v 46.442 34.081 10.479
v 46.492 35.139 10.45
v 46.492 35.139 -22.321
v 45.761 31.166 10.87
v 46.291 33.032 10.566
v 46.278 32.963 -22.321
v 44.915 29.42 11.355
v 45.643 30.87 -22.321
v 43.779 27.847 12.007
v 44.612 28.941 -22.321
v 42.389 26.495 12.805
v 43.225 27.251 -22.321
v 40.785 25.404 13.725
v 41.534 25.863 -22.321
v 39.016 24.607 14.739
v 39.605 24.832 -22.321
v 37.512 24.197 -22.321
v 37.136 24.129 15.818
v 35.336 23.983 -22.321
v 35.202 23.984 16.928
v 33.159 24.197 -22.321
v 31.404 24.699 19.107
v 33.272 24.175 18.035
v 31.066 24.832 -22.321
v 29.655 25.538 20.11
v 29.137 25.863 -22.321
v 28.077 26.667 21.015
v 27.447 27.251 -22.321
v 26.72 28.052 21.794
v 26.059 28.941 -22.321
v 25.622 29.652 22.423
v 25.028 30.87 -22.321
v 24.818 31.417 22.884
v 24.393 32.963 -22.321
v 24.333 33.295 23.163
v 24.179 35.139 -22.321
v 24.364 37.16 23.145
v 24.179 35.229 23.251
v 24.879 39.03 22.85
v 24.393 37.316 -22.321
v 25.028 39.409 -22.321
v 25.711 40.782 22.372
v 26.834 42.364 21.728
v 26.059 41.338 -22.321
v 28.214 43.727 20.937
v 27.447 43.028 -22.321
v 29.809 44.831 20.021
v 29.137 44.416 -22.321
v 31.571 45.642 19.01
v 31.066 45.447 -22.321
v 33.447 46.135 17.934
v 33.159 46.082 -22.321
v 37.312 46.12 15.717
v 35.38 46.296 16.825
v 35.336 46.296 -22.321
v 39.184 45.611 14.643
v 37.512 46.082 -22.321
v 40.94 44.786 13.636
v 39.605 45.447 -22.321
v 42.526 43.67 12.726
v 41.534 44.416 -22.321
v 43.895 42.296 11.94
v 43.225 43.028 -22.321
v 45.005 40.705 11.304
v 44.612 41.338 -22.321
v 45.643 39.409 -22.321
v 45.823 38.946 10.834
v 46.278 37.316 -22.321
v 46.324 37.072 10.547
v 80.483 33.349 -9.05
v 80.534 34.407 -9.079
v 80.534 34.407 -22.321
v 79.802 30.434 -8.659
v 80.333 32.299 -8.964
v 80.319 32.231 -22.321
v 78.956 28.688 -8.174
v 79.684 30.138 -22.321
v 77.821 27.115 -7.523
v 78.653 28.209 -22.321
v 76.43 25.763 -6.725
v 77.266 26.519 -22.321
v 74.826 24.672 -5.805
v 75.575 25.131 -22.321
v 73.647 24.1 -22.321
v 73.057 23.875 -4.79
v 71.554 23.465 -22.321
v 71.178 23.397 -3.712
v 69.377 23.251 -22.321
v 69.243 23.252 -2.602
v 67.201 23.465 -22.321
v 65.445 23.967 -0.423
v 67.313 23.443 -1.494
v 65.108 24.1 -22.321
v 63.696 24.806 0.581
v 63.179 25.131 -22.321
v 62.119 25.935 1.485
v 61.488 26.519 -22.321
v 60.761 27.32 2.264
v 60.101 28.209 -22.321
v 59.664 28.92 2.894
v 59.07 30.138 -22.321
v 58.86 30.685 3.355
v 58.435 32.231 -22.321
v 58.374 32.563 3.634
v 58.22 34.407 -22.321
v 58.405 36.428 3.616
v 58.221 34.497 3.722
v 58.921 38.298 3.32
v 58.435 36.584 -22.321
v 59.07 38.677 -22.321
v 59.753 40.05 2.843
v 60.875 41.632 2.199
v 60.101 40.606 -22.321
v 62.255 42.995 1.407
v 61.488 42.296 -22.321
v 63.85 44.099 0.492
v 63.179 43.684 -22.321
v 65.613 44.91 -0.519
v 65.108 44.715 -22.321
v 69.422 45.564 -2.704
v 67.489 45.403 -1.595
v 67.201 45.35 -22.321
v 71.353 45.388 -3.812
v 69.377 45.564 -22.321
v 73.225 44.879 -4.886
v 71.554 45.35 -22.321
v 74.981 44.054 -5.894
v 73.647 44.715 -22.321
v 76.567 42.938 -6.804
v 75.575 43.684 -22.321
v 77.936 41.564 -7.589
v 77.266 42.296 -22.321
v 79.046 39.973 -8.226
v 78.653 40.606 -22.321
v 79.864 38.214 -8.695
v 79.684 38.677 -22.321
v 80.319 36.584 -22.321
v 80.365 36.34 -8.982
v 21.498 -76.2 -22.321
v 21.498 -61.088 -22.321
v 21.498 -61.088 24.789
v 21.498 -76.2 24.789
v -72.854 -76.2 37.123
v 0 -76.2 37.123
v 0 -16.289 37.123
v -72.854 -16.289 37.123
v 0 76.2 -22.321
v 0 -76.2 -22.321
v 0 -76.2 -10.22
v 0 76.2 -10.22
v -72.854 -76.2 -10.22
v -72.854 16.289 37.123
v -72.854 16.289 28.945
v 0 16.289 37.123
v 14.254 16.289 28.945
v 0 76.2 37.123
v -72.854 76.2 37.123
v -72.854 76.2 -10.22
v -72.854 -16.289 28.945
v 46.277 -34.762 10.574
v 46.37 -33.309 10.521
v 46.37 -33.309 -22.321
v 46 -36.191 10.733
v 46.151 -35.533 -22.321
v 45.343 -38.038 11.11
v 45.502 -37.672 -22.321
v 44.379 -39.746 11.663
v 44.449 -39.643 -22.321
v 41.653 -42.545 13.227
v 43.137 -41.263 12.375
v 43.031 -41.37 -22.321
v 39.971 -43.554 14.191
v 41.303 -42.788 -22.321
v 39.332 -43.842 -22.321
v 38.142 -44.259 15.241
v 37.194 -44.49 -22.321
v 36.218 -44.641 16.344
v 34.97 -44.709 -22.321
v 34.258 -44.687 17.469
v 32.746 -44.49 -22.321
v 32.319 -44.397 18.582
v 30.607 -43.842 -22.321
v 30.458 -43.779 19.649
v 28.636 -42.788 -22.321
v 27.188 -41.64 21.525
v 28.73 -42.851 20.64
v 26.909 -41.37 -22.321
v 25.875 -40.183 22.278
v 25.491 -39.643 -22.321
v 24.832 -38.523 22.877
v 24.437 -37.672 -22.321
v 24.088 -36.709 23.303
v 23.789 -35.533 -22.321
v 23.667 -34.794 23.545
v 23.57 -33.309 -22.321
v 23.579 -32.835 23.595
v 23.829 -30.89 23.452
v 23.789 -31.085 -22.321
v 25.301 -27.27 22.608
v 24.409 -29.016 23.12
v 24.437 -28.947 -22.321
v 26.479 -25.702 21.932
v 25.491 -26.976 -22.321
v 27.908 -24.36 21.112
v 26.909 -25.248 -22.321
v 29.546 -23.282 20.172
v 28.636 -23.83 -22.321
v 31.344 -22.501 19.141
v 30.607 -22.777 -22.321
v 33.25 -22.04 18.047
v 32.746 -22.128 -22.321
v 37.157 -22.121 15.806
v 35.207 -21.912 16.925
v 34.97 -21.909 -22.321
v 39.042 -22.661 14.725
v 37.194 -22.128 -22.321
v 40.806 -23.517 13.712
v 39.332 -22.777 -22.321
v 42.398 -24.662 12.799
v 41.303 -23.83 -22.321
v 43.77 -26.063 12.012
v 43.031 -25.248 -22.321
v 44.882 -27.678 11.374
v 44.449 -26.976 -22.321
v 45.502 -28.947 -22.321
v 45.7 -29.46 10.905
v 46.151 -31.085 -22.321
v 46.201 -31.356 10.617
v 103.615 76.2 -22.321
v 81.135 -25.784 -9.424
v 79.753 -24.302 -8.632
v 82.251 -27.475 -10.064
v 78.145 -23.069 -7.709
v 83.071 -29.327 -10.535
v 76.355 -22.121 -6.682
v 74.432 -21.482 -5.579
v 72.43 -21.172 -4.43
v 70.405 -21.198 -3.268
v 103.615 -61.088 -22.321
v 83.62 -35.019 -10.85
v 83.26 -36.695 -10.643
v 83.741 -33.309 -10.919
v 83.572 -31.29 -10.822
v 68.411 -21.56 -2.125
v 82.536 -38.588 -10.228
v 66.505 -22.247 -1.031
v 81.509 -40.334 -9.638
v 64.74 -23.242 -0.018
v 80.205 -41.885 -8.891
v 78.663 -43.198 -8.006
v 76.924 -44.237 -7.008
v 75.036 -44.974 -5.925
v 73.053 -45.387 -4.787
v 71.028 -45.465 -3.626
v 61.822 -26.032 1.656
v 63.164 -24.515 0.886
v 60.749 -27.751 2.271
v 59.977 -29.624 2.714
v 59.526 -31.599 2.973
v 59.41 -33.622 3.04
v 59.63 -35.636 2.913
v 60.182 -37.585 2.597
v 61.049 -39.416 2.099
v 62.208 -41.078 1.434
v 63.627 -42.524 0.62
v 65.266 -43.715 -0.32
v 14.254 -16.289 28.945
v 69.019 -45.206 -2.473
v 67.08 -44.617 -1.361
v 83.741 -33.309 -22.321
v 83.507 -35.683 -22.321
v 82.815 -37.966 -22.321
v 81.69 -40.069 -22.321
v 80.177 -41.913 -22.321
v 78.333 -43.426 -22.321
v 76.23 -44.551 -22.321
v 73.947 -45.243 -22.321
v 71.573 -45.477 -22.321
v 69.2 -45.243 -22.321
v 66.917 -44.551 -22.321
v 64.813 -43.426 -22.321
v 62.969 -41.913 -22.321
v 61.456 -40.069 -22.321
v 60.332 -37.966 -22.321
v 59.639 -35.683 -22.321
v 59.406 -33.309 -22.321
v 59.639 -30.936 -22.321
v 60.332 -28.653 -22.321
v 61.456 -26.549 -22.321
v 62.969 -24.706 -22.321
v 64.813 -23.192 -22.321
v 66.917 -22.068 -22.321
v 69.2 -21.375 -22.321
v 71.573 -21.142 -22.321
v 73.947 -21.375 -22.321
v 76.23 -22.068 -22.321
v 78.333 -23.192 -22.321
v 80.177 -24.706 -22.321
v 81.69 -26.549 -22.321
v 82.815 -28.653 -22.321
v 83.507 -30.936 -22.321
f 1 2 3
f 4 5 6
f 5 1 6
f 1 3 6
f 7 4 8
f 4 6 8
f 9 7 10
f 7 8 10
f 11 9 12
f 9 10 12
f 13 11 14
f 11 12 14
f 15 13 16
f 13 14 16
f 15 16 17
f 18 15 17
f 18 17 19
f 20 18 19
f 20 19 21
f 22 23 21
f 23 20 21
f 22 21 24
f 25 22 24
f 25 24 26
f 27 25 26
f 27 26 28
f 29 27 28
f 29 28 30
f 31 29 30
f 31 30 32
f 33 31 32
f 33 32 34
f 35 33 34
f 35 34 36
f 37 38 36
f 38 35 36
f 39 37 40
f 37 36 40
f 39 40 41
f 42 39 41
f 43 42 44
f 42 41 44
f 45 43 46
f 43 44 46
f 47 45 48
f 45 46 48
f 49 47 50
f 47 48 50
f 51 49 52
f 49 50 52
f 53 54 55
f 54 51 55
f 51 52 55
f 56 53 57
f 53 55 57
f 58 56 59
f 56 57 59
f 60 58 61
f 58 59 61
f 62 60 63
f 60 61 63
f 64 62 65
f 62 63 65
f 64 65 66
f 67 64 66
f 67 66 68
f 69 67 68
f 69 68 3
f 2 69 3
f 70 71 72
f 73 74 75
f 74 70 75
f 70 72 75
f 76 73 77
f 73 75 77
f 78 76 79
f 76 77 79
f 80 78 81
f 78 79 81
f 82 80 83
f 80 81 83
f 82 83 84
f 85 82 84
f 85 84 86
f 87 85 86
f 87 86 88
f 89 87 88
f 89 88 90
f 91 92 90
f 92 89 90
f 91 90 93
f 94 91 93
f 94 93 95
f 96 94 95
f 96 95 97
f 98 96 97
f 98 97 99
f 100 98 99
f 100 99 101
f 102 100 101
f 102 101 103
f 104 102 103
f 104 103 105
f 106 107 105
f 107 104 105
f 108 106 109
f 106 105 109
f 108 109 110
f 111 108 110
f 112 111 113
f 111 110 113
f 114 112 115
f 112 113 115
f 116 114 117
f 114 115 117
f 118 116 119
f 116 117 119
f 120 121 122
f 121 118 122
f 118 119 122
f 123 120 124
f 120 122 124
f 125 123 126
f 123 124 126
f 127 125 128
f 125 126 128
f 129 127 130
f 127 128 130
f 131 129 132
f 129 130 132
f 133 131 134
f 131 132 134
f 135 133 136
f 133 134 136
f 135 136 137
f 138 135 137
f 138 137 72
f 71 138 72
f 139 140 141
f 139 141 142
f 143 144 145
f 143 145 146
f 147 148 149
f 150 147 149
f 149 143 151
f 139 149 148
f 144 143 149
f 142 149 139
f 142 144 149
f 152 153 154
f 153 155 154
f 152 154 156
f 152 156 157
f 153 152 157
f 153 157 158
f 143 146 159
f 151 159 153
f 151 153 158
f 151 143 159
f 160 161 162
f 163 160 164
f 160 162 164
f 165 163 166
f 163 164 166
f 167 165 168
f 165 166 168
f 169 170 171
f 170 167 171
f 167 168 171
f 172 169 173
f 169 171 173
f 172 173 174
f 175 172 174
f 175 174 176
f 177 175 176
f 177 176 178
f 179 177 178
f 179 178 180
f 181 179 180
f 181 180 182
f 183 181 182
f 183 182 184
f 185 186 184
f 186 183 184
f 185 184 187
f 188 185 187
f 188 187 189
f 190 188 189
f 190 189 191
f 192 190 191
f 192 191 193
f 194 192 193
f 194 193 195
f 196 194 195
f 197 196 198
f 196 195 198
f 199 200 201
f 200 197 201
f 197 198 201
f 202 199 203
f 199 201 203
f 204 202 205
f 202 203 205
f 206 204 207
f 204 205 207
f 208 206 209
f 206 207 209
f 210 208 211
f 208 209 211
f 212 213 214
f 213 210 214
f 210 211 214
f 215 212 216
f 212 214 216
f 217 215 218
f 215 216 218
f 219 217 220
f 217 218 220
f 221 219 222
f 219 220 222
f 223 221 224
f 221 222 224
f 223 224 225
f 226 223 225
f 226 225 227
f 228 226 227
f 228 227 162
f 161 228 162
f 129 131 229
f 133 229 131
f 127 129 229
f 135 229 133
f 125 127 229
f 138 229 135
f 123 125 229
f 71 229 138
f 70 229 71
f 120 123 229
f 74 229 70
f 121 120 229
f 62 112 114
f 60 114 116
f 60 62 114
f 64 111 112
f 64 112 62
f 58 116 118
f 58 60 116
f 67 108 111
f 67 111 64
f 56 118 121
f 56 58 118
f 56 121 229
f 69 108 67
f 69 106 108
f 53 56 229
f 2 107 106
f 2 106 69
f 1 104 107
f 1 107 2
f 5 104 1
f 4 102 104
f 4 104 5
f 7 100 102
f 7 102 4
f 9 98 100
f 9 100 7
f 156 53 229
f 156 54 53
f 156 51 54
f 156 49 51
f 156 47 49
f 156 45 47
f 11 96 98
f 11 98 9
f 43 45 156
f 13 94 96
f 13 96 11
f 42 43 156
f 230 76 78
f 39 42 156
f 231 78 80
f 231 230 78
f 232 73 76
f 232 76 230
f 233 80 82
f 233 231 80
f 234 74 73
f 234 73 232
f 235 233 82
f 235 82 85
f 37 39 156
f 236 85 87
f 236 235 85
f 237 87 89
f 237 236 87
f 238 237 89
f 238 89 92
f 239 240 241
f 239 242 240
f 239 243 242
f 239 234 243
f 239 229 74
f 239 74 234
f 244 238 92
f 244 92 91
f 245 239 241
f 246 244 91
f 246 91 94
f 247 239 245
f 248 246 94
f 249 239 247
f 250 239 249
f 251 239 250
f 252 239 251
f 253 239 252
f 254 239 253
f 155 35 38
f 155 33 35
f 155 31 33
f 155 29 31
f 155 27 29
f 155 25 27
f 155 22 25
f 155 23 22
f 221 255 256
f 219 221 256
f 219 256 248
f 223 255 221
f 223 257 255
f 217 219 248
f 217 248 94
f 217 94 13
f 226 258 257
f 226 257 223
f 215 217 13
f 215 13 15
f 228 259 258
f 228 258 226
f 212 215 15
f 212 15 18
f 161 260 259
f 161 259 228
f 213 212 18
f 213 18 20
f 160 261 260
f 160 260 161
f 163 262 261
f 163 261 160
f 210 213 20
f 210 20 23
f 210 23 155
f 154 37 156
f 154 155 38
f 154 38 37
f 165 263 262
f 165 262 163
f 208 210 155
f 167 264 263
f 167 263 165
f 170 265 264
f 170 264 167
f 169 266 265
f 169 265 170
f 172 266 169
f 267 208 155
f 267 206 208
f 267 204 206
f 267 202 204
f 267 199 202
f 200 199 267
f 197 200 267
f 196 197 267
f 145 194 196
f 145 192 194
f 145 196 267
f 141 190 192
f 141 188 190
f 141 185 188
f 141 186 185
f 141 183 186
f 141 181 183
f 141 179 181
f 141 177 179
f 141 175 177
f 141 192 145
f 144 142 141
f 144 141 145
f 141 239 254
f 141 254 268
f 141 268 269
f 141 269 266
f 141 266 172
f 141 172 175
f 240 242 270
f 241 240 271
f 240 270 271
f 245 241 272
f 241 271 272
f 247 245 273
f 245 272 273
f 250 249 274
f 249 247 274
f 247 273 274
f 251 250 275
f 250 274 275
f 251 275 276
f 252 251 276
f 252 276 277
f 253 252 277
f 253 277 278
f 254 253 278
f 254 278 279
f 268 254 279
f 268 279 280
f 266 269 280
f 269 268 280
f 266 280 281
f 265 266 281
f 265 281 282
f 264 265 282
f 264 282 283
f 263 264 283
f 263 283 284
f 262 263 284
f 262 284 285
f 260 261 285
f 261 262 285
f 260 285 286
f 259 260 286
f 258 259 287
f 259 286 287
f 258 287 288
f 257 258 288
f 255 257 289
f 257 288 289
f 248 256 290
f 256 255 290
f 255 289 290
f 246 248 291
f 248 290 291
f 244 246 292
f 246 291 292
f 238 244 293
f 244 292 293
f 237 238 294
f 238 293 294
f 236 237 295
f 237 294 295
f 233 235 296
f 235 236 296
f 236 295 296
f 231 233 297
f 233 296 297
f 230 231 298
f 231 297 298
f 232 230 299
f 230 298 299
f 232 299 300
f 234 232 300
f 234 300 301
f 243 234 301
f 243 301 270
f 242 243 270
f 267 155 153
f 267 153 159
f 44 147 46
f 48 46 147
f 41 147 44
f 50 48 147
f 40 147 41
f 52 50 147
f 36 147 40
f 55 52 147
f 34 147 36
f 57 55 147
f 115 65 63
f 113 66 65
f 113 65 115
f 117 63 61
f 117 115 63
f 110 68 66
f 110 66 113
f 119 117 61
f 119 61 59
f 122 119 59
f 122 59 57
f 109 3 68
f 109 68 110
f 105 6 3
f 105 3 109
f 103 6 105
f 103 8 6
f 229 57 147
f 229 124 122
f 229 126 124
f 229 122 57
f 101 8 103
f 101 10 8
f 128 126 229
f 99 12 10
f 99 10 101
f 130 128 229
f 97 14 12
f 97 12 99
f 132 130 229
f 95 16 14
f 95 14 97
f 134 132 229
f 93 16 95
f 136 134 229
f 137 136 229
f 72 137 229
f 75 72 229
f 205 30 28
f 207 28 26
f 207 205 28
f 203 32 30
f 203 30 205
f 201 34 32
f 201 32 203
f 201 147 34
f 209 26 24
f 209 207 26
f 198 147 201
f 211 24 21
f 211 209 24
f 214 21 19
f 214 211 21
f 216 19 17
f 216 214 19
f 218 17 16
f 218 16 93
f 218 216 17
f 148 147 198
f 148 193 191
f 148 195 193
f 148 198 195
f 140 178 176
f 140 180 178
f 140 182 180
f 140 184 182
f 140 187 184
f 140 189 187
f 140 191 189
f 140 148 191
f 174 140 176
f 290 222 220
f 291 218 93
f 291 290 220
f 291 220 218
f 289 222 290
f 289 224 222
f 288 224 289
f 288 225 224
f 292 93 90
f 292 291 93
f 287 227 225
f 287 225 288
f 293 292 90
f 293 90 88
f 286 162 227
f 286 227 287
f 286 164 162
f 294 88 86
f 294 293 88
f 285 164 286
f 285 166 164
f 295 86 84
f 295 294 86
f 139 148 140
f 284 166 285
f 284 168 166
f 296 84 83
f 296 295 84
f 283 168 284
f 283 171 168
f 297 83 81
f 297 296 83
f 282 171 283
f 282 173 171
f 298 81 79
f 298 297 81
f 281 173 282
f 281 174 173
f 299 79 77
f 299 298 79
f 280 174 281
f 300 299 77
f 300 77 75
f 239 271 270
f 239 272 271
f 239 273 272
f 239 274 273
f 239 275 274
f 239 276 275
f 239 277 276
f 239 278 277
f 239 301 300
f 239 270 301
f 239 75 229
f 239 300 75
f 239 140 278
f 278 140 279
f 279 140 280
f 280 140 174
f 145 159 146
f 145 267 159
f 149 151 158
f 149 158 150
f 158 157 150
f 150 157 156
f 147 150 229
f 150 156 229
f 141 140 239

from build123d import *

# Parameters (mm, degrees)
F1_DEPTH  = 76.2
F2_DEPTH  = 76.2
F3_W      = 72.8542578737
F3_H      = 12.1001238003
F4_DEPTH  = 152.401
F5_W      = 82.1163672954
F5_H      = 15.1120005071
F6_DEPTH  = 59.4443229417
F7_W      = 32.5772352517
F7_H      = 8.1773027778
F8_DEPTH  = 176.4699010899
F9_R      = 11.4001375148
F10_DEPTH = 59.4443229417
F11_R     = 12.1676085245
F12_DEPTH = 59.4443229417
F13_R     = 11.1566059008
F14_DEPTH = 59.4443229417
F15_R     = 11.1566059008
F16_DEPTH = 59.4443229417


with BuildPart() as f1:
    # F0 (on Front) → F1 (new body)
    with BuildSketch(Plane.XZ):
        Polygon((103.6146432161, -22.3206151277), (0, 37.122707814), (-72.8542578737, 37.122707814), (-72.8542578737, -22.3206151277), align=None)
    extrude(amount=F1_DEPTH)

    # F2 (add): a face of the model
    f2_faces = [f1.faces().sort_by_distance(p)[0] for p in [
        (-6.935088319, 0, 3.283766903),
    ]]
    extrude(f2_faces, amount=F2_DEPTH)

    # F3 (on face) → F4 (cut, through all)
    with BuildSketch(Plane.XZ.offset(76.2)):
        with Locations((-36.4271289369, -16.2705532275)):
            Rectangle(F3_W, F3_H)
    extrude(amount=-F4_DEPTH, mode=Mode.SUBTRACT)

    # F5 (on face) → F6 (cut, through all)
    with BuildSketch(Plane(origin=(0, 0, -22.3206151277), x_dir=(1, 0, 0), z_dir=(0, 0, -1))):
        with Locations((62.5564595684, 68.6439997464)):
            Rectangle(F5_W, F5_H)
    extrude(amount=-F6_DEPTH, mode=Mode.SUBTRACT)

    # F7 (on face) → F8 (cut, through all)
    with BuildSketch(Plane(origin=(-72.8542578737, 0, 0), x_dir=(0, -1, 0), z_dir=(-1, 0, 0))):
        with Locations((0, 33.0340564251)):
            Rectangle(F7_W, F7_H)
    extrude(amount=-F8_DEPTH, mode=Mode.SUBTRACT)

    # F9 (on face) → F10 (cut, through all)
    with BuildSketch(Plane(origin=(0, 0, -22.3206151277), x_dir=(1, 0, 0), z_dir=(0, 0, -1))):
        with Locations((34.9696464837, 33.3093106747)):
            Circle(F9_R)
    extrude(amount=-F10_DEPTH, mode=Mode.SUBTRACT)

    # F11 (on face) → F12 (cut, through all)
    with BuildSketch(Plane(origin=(0, 0, -22.3206151277), x_dir=(1, 0, 0), z_dir=(0, 0, -1))):
        with Locations((71.5732872486, 33.3093106747)):
            Circle(F11_R)
    extrude(amount=-F12_DEPTH, mode=Mode.SUBTRACT)

    # F13 (on face) → F14 (cut, through all)
    with BuildSketch(Plane(origin=(0, 0, -22.3206151277), x_dir=(1, 0, 0), z_dir=(0, 0, -1))):
        with Locations((35.3356823325, -35.1394936442)):
            Circle(F13_R)
    extrude(amount=-F14_DEPTH, mode=Mode.SUBTRACT)

    # F15 (on face) → F16 (cut, through all)
    with BuildSketch(Plane(origin=(0, 0, -22.3206151277), x_dir=(1, 0, 0), z_dir=(0, 0, -1))):
        with Locations((69.3770647049, -34.4074219465)):
            Circle(F15_R)
    extrude(amount=-F16_DEPTH, mode=Mode.SUBTRACT)


solid = f1.part
